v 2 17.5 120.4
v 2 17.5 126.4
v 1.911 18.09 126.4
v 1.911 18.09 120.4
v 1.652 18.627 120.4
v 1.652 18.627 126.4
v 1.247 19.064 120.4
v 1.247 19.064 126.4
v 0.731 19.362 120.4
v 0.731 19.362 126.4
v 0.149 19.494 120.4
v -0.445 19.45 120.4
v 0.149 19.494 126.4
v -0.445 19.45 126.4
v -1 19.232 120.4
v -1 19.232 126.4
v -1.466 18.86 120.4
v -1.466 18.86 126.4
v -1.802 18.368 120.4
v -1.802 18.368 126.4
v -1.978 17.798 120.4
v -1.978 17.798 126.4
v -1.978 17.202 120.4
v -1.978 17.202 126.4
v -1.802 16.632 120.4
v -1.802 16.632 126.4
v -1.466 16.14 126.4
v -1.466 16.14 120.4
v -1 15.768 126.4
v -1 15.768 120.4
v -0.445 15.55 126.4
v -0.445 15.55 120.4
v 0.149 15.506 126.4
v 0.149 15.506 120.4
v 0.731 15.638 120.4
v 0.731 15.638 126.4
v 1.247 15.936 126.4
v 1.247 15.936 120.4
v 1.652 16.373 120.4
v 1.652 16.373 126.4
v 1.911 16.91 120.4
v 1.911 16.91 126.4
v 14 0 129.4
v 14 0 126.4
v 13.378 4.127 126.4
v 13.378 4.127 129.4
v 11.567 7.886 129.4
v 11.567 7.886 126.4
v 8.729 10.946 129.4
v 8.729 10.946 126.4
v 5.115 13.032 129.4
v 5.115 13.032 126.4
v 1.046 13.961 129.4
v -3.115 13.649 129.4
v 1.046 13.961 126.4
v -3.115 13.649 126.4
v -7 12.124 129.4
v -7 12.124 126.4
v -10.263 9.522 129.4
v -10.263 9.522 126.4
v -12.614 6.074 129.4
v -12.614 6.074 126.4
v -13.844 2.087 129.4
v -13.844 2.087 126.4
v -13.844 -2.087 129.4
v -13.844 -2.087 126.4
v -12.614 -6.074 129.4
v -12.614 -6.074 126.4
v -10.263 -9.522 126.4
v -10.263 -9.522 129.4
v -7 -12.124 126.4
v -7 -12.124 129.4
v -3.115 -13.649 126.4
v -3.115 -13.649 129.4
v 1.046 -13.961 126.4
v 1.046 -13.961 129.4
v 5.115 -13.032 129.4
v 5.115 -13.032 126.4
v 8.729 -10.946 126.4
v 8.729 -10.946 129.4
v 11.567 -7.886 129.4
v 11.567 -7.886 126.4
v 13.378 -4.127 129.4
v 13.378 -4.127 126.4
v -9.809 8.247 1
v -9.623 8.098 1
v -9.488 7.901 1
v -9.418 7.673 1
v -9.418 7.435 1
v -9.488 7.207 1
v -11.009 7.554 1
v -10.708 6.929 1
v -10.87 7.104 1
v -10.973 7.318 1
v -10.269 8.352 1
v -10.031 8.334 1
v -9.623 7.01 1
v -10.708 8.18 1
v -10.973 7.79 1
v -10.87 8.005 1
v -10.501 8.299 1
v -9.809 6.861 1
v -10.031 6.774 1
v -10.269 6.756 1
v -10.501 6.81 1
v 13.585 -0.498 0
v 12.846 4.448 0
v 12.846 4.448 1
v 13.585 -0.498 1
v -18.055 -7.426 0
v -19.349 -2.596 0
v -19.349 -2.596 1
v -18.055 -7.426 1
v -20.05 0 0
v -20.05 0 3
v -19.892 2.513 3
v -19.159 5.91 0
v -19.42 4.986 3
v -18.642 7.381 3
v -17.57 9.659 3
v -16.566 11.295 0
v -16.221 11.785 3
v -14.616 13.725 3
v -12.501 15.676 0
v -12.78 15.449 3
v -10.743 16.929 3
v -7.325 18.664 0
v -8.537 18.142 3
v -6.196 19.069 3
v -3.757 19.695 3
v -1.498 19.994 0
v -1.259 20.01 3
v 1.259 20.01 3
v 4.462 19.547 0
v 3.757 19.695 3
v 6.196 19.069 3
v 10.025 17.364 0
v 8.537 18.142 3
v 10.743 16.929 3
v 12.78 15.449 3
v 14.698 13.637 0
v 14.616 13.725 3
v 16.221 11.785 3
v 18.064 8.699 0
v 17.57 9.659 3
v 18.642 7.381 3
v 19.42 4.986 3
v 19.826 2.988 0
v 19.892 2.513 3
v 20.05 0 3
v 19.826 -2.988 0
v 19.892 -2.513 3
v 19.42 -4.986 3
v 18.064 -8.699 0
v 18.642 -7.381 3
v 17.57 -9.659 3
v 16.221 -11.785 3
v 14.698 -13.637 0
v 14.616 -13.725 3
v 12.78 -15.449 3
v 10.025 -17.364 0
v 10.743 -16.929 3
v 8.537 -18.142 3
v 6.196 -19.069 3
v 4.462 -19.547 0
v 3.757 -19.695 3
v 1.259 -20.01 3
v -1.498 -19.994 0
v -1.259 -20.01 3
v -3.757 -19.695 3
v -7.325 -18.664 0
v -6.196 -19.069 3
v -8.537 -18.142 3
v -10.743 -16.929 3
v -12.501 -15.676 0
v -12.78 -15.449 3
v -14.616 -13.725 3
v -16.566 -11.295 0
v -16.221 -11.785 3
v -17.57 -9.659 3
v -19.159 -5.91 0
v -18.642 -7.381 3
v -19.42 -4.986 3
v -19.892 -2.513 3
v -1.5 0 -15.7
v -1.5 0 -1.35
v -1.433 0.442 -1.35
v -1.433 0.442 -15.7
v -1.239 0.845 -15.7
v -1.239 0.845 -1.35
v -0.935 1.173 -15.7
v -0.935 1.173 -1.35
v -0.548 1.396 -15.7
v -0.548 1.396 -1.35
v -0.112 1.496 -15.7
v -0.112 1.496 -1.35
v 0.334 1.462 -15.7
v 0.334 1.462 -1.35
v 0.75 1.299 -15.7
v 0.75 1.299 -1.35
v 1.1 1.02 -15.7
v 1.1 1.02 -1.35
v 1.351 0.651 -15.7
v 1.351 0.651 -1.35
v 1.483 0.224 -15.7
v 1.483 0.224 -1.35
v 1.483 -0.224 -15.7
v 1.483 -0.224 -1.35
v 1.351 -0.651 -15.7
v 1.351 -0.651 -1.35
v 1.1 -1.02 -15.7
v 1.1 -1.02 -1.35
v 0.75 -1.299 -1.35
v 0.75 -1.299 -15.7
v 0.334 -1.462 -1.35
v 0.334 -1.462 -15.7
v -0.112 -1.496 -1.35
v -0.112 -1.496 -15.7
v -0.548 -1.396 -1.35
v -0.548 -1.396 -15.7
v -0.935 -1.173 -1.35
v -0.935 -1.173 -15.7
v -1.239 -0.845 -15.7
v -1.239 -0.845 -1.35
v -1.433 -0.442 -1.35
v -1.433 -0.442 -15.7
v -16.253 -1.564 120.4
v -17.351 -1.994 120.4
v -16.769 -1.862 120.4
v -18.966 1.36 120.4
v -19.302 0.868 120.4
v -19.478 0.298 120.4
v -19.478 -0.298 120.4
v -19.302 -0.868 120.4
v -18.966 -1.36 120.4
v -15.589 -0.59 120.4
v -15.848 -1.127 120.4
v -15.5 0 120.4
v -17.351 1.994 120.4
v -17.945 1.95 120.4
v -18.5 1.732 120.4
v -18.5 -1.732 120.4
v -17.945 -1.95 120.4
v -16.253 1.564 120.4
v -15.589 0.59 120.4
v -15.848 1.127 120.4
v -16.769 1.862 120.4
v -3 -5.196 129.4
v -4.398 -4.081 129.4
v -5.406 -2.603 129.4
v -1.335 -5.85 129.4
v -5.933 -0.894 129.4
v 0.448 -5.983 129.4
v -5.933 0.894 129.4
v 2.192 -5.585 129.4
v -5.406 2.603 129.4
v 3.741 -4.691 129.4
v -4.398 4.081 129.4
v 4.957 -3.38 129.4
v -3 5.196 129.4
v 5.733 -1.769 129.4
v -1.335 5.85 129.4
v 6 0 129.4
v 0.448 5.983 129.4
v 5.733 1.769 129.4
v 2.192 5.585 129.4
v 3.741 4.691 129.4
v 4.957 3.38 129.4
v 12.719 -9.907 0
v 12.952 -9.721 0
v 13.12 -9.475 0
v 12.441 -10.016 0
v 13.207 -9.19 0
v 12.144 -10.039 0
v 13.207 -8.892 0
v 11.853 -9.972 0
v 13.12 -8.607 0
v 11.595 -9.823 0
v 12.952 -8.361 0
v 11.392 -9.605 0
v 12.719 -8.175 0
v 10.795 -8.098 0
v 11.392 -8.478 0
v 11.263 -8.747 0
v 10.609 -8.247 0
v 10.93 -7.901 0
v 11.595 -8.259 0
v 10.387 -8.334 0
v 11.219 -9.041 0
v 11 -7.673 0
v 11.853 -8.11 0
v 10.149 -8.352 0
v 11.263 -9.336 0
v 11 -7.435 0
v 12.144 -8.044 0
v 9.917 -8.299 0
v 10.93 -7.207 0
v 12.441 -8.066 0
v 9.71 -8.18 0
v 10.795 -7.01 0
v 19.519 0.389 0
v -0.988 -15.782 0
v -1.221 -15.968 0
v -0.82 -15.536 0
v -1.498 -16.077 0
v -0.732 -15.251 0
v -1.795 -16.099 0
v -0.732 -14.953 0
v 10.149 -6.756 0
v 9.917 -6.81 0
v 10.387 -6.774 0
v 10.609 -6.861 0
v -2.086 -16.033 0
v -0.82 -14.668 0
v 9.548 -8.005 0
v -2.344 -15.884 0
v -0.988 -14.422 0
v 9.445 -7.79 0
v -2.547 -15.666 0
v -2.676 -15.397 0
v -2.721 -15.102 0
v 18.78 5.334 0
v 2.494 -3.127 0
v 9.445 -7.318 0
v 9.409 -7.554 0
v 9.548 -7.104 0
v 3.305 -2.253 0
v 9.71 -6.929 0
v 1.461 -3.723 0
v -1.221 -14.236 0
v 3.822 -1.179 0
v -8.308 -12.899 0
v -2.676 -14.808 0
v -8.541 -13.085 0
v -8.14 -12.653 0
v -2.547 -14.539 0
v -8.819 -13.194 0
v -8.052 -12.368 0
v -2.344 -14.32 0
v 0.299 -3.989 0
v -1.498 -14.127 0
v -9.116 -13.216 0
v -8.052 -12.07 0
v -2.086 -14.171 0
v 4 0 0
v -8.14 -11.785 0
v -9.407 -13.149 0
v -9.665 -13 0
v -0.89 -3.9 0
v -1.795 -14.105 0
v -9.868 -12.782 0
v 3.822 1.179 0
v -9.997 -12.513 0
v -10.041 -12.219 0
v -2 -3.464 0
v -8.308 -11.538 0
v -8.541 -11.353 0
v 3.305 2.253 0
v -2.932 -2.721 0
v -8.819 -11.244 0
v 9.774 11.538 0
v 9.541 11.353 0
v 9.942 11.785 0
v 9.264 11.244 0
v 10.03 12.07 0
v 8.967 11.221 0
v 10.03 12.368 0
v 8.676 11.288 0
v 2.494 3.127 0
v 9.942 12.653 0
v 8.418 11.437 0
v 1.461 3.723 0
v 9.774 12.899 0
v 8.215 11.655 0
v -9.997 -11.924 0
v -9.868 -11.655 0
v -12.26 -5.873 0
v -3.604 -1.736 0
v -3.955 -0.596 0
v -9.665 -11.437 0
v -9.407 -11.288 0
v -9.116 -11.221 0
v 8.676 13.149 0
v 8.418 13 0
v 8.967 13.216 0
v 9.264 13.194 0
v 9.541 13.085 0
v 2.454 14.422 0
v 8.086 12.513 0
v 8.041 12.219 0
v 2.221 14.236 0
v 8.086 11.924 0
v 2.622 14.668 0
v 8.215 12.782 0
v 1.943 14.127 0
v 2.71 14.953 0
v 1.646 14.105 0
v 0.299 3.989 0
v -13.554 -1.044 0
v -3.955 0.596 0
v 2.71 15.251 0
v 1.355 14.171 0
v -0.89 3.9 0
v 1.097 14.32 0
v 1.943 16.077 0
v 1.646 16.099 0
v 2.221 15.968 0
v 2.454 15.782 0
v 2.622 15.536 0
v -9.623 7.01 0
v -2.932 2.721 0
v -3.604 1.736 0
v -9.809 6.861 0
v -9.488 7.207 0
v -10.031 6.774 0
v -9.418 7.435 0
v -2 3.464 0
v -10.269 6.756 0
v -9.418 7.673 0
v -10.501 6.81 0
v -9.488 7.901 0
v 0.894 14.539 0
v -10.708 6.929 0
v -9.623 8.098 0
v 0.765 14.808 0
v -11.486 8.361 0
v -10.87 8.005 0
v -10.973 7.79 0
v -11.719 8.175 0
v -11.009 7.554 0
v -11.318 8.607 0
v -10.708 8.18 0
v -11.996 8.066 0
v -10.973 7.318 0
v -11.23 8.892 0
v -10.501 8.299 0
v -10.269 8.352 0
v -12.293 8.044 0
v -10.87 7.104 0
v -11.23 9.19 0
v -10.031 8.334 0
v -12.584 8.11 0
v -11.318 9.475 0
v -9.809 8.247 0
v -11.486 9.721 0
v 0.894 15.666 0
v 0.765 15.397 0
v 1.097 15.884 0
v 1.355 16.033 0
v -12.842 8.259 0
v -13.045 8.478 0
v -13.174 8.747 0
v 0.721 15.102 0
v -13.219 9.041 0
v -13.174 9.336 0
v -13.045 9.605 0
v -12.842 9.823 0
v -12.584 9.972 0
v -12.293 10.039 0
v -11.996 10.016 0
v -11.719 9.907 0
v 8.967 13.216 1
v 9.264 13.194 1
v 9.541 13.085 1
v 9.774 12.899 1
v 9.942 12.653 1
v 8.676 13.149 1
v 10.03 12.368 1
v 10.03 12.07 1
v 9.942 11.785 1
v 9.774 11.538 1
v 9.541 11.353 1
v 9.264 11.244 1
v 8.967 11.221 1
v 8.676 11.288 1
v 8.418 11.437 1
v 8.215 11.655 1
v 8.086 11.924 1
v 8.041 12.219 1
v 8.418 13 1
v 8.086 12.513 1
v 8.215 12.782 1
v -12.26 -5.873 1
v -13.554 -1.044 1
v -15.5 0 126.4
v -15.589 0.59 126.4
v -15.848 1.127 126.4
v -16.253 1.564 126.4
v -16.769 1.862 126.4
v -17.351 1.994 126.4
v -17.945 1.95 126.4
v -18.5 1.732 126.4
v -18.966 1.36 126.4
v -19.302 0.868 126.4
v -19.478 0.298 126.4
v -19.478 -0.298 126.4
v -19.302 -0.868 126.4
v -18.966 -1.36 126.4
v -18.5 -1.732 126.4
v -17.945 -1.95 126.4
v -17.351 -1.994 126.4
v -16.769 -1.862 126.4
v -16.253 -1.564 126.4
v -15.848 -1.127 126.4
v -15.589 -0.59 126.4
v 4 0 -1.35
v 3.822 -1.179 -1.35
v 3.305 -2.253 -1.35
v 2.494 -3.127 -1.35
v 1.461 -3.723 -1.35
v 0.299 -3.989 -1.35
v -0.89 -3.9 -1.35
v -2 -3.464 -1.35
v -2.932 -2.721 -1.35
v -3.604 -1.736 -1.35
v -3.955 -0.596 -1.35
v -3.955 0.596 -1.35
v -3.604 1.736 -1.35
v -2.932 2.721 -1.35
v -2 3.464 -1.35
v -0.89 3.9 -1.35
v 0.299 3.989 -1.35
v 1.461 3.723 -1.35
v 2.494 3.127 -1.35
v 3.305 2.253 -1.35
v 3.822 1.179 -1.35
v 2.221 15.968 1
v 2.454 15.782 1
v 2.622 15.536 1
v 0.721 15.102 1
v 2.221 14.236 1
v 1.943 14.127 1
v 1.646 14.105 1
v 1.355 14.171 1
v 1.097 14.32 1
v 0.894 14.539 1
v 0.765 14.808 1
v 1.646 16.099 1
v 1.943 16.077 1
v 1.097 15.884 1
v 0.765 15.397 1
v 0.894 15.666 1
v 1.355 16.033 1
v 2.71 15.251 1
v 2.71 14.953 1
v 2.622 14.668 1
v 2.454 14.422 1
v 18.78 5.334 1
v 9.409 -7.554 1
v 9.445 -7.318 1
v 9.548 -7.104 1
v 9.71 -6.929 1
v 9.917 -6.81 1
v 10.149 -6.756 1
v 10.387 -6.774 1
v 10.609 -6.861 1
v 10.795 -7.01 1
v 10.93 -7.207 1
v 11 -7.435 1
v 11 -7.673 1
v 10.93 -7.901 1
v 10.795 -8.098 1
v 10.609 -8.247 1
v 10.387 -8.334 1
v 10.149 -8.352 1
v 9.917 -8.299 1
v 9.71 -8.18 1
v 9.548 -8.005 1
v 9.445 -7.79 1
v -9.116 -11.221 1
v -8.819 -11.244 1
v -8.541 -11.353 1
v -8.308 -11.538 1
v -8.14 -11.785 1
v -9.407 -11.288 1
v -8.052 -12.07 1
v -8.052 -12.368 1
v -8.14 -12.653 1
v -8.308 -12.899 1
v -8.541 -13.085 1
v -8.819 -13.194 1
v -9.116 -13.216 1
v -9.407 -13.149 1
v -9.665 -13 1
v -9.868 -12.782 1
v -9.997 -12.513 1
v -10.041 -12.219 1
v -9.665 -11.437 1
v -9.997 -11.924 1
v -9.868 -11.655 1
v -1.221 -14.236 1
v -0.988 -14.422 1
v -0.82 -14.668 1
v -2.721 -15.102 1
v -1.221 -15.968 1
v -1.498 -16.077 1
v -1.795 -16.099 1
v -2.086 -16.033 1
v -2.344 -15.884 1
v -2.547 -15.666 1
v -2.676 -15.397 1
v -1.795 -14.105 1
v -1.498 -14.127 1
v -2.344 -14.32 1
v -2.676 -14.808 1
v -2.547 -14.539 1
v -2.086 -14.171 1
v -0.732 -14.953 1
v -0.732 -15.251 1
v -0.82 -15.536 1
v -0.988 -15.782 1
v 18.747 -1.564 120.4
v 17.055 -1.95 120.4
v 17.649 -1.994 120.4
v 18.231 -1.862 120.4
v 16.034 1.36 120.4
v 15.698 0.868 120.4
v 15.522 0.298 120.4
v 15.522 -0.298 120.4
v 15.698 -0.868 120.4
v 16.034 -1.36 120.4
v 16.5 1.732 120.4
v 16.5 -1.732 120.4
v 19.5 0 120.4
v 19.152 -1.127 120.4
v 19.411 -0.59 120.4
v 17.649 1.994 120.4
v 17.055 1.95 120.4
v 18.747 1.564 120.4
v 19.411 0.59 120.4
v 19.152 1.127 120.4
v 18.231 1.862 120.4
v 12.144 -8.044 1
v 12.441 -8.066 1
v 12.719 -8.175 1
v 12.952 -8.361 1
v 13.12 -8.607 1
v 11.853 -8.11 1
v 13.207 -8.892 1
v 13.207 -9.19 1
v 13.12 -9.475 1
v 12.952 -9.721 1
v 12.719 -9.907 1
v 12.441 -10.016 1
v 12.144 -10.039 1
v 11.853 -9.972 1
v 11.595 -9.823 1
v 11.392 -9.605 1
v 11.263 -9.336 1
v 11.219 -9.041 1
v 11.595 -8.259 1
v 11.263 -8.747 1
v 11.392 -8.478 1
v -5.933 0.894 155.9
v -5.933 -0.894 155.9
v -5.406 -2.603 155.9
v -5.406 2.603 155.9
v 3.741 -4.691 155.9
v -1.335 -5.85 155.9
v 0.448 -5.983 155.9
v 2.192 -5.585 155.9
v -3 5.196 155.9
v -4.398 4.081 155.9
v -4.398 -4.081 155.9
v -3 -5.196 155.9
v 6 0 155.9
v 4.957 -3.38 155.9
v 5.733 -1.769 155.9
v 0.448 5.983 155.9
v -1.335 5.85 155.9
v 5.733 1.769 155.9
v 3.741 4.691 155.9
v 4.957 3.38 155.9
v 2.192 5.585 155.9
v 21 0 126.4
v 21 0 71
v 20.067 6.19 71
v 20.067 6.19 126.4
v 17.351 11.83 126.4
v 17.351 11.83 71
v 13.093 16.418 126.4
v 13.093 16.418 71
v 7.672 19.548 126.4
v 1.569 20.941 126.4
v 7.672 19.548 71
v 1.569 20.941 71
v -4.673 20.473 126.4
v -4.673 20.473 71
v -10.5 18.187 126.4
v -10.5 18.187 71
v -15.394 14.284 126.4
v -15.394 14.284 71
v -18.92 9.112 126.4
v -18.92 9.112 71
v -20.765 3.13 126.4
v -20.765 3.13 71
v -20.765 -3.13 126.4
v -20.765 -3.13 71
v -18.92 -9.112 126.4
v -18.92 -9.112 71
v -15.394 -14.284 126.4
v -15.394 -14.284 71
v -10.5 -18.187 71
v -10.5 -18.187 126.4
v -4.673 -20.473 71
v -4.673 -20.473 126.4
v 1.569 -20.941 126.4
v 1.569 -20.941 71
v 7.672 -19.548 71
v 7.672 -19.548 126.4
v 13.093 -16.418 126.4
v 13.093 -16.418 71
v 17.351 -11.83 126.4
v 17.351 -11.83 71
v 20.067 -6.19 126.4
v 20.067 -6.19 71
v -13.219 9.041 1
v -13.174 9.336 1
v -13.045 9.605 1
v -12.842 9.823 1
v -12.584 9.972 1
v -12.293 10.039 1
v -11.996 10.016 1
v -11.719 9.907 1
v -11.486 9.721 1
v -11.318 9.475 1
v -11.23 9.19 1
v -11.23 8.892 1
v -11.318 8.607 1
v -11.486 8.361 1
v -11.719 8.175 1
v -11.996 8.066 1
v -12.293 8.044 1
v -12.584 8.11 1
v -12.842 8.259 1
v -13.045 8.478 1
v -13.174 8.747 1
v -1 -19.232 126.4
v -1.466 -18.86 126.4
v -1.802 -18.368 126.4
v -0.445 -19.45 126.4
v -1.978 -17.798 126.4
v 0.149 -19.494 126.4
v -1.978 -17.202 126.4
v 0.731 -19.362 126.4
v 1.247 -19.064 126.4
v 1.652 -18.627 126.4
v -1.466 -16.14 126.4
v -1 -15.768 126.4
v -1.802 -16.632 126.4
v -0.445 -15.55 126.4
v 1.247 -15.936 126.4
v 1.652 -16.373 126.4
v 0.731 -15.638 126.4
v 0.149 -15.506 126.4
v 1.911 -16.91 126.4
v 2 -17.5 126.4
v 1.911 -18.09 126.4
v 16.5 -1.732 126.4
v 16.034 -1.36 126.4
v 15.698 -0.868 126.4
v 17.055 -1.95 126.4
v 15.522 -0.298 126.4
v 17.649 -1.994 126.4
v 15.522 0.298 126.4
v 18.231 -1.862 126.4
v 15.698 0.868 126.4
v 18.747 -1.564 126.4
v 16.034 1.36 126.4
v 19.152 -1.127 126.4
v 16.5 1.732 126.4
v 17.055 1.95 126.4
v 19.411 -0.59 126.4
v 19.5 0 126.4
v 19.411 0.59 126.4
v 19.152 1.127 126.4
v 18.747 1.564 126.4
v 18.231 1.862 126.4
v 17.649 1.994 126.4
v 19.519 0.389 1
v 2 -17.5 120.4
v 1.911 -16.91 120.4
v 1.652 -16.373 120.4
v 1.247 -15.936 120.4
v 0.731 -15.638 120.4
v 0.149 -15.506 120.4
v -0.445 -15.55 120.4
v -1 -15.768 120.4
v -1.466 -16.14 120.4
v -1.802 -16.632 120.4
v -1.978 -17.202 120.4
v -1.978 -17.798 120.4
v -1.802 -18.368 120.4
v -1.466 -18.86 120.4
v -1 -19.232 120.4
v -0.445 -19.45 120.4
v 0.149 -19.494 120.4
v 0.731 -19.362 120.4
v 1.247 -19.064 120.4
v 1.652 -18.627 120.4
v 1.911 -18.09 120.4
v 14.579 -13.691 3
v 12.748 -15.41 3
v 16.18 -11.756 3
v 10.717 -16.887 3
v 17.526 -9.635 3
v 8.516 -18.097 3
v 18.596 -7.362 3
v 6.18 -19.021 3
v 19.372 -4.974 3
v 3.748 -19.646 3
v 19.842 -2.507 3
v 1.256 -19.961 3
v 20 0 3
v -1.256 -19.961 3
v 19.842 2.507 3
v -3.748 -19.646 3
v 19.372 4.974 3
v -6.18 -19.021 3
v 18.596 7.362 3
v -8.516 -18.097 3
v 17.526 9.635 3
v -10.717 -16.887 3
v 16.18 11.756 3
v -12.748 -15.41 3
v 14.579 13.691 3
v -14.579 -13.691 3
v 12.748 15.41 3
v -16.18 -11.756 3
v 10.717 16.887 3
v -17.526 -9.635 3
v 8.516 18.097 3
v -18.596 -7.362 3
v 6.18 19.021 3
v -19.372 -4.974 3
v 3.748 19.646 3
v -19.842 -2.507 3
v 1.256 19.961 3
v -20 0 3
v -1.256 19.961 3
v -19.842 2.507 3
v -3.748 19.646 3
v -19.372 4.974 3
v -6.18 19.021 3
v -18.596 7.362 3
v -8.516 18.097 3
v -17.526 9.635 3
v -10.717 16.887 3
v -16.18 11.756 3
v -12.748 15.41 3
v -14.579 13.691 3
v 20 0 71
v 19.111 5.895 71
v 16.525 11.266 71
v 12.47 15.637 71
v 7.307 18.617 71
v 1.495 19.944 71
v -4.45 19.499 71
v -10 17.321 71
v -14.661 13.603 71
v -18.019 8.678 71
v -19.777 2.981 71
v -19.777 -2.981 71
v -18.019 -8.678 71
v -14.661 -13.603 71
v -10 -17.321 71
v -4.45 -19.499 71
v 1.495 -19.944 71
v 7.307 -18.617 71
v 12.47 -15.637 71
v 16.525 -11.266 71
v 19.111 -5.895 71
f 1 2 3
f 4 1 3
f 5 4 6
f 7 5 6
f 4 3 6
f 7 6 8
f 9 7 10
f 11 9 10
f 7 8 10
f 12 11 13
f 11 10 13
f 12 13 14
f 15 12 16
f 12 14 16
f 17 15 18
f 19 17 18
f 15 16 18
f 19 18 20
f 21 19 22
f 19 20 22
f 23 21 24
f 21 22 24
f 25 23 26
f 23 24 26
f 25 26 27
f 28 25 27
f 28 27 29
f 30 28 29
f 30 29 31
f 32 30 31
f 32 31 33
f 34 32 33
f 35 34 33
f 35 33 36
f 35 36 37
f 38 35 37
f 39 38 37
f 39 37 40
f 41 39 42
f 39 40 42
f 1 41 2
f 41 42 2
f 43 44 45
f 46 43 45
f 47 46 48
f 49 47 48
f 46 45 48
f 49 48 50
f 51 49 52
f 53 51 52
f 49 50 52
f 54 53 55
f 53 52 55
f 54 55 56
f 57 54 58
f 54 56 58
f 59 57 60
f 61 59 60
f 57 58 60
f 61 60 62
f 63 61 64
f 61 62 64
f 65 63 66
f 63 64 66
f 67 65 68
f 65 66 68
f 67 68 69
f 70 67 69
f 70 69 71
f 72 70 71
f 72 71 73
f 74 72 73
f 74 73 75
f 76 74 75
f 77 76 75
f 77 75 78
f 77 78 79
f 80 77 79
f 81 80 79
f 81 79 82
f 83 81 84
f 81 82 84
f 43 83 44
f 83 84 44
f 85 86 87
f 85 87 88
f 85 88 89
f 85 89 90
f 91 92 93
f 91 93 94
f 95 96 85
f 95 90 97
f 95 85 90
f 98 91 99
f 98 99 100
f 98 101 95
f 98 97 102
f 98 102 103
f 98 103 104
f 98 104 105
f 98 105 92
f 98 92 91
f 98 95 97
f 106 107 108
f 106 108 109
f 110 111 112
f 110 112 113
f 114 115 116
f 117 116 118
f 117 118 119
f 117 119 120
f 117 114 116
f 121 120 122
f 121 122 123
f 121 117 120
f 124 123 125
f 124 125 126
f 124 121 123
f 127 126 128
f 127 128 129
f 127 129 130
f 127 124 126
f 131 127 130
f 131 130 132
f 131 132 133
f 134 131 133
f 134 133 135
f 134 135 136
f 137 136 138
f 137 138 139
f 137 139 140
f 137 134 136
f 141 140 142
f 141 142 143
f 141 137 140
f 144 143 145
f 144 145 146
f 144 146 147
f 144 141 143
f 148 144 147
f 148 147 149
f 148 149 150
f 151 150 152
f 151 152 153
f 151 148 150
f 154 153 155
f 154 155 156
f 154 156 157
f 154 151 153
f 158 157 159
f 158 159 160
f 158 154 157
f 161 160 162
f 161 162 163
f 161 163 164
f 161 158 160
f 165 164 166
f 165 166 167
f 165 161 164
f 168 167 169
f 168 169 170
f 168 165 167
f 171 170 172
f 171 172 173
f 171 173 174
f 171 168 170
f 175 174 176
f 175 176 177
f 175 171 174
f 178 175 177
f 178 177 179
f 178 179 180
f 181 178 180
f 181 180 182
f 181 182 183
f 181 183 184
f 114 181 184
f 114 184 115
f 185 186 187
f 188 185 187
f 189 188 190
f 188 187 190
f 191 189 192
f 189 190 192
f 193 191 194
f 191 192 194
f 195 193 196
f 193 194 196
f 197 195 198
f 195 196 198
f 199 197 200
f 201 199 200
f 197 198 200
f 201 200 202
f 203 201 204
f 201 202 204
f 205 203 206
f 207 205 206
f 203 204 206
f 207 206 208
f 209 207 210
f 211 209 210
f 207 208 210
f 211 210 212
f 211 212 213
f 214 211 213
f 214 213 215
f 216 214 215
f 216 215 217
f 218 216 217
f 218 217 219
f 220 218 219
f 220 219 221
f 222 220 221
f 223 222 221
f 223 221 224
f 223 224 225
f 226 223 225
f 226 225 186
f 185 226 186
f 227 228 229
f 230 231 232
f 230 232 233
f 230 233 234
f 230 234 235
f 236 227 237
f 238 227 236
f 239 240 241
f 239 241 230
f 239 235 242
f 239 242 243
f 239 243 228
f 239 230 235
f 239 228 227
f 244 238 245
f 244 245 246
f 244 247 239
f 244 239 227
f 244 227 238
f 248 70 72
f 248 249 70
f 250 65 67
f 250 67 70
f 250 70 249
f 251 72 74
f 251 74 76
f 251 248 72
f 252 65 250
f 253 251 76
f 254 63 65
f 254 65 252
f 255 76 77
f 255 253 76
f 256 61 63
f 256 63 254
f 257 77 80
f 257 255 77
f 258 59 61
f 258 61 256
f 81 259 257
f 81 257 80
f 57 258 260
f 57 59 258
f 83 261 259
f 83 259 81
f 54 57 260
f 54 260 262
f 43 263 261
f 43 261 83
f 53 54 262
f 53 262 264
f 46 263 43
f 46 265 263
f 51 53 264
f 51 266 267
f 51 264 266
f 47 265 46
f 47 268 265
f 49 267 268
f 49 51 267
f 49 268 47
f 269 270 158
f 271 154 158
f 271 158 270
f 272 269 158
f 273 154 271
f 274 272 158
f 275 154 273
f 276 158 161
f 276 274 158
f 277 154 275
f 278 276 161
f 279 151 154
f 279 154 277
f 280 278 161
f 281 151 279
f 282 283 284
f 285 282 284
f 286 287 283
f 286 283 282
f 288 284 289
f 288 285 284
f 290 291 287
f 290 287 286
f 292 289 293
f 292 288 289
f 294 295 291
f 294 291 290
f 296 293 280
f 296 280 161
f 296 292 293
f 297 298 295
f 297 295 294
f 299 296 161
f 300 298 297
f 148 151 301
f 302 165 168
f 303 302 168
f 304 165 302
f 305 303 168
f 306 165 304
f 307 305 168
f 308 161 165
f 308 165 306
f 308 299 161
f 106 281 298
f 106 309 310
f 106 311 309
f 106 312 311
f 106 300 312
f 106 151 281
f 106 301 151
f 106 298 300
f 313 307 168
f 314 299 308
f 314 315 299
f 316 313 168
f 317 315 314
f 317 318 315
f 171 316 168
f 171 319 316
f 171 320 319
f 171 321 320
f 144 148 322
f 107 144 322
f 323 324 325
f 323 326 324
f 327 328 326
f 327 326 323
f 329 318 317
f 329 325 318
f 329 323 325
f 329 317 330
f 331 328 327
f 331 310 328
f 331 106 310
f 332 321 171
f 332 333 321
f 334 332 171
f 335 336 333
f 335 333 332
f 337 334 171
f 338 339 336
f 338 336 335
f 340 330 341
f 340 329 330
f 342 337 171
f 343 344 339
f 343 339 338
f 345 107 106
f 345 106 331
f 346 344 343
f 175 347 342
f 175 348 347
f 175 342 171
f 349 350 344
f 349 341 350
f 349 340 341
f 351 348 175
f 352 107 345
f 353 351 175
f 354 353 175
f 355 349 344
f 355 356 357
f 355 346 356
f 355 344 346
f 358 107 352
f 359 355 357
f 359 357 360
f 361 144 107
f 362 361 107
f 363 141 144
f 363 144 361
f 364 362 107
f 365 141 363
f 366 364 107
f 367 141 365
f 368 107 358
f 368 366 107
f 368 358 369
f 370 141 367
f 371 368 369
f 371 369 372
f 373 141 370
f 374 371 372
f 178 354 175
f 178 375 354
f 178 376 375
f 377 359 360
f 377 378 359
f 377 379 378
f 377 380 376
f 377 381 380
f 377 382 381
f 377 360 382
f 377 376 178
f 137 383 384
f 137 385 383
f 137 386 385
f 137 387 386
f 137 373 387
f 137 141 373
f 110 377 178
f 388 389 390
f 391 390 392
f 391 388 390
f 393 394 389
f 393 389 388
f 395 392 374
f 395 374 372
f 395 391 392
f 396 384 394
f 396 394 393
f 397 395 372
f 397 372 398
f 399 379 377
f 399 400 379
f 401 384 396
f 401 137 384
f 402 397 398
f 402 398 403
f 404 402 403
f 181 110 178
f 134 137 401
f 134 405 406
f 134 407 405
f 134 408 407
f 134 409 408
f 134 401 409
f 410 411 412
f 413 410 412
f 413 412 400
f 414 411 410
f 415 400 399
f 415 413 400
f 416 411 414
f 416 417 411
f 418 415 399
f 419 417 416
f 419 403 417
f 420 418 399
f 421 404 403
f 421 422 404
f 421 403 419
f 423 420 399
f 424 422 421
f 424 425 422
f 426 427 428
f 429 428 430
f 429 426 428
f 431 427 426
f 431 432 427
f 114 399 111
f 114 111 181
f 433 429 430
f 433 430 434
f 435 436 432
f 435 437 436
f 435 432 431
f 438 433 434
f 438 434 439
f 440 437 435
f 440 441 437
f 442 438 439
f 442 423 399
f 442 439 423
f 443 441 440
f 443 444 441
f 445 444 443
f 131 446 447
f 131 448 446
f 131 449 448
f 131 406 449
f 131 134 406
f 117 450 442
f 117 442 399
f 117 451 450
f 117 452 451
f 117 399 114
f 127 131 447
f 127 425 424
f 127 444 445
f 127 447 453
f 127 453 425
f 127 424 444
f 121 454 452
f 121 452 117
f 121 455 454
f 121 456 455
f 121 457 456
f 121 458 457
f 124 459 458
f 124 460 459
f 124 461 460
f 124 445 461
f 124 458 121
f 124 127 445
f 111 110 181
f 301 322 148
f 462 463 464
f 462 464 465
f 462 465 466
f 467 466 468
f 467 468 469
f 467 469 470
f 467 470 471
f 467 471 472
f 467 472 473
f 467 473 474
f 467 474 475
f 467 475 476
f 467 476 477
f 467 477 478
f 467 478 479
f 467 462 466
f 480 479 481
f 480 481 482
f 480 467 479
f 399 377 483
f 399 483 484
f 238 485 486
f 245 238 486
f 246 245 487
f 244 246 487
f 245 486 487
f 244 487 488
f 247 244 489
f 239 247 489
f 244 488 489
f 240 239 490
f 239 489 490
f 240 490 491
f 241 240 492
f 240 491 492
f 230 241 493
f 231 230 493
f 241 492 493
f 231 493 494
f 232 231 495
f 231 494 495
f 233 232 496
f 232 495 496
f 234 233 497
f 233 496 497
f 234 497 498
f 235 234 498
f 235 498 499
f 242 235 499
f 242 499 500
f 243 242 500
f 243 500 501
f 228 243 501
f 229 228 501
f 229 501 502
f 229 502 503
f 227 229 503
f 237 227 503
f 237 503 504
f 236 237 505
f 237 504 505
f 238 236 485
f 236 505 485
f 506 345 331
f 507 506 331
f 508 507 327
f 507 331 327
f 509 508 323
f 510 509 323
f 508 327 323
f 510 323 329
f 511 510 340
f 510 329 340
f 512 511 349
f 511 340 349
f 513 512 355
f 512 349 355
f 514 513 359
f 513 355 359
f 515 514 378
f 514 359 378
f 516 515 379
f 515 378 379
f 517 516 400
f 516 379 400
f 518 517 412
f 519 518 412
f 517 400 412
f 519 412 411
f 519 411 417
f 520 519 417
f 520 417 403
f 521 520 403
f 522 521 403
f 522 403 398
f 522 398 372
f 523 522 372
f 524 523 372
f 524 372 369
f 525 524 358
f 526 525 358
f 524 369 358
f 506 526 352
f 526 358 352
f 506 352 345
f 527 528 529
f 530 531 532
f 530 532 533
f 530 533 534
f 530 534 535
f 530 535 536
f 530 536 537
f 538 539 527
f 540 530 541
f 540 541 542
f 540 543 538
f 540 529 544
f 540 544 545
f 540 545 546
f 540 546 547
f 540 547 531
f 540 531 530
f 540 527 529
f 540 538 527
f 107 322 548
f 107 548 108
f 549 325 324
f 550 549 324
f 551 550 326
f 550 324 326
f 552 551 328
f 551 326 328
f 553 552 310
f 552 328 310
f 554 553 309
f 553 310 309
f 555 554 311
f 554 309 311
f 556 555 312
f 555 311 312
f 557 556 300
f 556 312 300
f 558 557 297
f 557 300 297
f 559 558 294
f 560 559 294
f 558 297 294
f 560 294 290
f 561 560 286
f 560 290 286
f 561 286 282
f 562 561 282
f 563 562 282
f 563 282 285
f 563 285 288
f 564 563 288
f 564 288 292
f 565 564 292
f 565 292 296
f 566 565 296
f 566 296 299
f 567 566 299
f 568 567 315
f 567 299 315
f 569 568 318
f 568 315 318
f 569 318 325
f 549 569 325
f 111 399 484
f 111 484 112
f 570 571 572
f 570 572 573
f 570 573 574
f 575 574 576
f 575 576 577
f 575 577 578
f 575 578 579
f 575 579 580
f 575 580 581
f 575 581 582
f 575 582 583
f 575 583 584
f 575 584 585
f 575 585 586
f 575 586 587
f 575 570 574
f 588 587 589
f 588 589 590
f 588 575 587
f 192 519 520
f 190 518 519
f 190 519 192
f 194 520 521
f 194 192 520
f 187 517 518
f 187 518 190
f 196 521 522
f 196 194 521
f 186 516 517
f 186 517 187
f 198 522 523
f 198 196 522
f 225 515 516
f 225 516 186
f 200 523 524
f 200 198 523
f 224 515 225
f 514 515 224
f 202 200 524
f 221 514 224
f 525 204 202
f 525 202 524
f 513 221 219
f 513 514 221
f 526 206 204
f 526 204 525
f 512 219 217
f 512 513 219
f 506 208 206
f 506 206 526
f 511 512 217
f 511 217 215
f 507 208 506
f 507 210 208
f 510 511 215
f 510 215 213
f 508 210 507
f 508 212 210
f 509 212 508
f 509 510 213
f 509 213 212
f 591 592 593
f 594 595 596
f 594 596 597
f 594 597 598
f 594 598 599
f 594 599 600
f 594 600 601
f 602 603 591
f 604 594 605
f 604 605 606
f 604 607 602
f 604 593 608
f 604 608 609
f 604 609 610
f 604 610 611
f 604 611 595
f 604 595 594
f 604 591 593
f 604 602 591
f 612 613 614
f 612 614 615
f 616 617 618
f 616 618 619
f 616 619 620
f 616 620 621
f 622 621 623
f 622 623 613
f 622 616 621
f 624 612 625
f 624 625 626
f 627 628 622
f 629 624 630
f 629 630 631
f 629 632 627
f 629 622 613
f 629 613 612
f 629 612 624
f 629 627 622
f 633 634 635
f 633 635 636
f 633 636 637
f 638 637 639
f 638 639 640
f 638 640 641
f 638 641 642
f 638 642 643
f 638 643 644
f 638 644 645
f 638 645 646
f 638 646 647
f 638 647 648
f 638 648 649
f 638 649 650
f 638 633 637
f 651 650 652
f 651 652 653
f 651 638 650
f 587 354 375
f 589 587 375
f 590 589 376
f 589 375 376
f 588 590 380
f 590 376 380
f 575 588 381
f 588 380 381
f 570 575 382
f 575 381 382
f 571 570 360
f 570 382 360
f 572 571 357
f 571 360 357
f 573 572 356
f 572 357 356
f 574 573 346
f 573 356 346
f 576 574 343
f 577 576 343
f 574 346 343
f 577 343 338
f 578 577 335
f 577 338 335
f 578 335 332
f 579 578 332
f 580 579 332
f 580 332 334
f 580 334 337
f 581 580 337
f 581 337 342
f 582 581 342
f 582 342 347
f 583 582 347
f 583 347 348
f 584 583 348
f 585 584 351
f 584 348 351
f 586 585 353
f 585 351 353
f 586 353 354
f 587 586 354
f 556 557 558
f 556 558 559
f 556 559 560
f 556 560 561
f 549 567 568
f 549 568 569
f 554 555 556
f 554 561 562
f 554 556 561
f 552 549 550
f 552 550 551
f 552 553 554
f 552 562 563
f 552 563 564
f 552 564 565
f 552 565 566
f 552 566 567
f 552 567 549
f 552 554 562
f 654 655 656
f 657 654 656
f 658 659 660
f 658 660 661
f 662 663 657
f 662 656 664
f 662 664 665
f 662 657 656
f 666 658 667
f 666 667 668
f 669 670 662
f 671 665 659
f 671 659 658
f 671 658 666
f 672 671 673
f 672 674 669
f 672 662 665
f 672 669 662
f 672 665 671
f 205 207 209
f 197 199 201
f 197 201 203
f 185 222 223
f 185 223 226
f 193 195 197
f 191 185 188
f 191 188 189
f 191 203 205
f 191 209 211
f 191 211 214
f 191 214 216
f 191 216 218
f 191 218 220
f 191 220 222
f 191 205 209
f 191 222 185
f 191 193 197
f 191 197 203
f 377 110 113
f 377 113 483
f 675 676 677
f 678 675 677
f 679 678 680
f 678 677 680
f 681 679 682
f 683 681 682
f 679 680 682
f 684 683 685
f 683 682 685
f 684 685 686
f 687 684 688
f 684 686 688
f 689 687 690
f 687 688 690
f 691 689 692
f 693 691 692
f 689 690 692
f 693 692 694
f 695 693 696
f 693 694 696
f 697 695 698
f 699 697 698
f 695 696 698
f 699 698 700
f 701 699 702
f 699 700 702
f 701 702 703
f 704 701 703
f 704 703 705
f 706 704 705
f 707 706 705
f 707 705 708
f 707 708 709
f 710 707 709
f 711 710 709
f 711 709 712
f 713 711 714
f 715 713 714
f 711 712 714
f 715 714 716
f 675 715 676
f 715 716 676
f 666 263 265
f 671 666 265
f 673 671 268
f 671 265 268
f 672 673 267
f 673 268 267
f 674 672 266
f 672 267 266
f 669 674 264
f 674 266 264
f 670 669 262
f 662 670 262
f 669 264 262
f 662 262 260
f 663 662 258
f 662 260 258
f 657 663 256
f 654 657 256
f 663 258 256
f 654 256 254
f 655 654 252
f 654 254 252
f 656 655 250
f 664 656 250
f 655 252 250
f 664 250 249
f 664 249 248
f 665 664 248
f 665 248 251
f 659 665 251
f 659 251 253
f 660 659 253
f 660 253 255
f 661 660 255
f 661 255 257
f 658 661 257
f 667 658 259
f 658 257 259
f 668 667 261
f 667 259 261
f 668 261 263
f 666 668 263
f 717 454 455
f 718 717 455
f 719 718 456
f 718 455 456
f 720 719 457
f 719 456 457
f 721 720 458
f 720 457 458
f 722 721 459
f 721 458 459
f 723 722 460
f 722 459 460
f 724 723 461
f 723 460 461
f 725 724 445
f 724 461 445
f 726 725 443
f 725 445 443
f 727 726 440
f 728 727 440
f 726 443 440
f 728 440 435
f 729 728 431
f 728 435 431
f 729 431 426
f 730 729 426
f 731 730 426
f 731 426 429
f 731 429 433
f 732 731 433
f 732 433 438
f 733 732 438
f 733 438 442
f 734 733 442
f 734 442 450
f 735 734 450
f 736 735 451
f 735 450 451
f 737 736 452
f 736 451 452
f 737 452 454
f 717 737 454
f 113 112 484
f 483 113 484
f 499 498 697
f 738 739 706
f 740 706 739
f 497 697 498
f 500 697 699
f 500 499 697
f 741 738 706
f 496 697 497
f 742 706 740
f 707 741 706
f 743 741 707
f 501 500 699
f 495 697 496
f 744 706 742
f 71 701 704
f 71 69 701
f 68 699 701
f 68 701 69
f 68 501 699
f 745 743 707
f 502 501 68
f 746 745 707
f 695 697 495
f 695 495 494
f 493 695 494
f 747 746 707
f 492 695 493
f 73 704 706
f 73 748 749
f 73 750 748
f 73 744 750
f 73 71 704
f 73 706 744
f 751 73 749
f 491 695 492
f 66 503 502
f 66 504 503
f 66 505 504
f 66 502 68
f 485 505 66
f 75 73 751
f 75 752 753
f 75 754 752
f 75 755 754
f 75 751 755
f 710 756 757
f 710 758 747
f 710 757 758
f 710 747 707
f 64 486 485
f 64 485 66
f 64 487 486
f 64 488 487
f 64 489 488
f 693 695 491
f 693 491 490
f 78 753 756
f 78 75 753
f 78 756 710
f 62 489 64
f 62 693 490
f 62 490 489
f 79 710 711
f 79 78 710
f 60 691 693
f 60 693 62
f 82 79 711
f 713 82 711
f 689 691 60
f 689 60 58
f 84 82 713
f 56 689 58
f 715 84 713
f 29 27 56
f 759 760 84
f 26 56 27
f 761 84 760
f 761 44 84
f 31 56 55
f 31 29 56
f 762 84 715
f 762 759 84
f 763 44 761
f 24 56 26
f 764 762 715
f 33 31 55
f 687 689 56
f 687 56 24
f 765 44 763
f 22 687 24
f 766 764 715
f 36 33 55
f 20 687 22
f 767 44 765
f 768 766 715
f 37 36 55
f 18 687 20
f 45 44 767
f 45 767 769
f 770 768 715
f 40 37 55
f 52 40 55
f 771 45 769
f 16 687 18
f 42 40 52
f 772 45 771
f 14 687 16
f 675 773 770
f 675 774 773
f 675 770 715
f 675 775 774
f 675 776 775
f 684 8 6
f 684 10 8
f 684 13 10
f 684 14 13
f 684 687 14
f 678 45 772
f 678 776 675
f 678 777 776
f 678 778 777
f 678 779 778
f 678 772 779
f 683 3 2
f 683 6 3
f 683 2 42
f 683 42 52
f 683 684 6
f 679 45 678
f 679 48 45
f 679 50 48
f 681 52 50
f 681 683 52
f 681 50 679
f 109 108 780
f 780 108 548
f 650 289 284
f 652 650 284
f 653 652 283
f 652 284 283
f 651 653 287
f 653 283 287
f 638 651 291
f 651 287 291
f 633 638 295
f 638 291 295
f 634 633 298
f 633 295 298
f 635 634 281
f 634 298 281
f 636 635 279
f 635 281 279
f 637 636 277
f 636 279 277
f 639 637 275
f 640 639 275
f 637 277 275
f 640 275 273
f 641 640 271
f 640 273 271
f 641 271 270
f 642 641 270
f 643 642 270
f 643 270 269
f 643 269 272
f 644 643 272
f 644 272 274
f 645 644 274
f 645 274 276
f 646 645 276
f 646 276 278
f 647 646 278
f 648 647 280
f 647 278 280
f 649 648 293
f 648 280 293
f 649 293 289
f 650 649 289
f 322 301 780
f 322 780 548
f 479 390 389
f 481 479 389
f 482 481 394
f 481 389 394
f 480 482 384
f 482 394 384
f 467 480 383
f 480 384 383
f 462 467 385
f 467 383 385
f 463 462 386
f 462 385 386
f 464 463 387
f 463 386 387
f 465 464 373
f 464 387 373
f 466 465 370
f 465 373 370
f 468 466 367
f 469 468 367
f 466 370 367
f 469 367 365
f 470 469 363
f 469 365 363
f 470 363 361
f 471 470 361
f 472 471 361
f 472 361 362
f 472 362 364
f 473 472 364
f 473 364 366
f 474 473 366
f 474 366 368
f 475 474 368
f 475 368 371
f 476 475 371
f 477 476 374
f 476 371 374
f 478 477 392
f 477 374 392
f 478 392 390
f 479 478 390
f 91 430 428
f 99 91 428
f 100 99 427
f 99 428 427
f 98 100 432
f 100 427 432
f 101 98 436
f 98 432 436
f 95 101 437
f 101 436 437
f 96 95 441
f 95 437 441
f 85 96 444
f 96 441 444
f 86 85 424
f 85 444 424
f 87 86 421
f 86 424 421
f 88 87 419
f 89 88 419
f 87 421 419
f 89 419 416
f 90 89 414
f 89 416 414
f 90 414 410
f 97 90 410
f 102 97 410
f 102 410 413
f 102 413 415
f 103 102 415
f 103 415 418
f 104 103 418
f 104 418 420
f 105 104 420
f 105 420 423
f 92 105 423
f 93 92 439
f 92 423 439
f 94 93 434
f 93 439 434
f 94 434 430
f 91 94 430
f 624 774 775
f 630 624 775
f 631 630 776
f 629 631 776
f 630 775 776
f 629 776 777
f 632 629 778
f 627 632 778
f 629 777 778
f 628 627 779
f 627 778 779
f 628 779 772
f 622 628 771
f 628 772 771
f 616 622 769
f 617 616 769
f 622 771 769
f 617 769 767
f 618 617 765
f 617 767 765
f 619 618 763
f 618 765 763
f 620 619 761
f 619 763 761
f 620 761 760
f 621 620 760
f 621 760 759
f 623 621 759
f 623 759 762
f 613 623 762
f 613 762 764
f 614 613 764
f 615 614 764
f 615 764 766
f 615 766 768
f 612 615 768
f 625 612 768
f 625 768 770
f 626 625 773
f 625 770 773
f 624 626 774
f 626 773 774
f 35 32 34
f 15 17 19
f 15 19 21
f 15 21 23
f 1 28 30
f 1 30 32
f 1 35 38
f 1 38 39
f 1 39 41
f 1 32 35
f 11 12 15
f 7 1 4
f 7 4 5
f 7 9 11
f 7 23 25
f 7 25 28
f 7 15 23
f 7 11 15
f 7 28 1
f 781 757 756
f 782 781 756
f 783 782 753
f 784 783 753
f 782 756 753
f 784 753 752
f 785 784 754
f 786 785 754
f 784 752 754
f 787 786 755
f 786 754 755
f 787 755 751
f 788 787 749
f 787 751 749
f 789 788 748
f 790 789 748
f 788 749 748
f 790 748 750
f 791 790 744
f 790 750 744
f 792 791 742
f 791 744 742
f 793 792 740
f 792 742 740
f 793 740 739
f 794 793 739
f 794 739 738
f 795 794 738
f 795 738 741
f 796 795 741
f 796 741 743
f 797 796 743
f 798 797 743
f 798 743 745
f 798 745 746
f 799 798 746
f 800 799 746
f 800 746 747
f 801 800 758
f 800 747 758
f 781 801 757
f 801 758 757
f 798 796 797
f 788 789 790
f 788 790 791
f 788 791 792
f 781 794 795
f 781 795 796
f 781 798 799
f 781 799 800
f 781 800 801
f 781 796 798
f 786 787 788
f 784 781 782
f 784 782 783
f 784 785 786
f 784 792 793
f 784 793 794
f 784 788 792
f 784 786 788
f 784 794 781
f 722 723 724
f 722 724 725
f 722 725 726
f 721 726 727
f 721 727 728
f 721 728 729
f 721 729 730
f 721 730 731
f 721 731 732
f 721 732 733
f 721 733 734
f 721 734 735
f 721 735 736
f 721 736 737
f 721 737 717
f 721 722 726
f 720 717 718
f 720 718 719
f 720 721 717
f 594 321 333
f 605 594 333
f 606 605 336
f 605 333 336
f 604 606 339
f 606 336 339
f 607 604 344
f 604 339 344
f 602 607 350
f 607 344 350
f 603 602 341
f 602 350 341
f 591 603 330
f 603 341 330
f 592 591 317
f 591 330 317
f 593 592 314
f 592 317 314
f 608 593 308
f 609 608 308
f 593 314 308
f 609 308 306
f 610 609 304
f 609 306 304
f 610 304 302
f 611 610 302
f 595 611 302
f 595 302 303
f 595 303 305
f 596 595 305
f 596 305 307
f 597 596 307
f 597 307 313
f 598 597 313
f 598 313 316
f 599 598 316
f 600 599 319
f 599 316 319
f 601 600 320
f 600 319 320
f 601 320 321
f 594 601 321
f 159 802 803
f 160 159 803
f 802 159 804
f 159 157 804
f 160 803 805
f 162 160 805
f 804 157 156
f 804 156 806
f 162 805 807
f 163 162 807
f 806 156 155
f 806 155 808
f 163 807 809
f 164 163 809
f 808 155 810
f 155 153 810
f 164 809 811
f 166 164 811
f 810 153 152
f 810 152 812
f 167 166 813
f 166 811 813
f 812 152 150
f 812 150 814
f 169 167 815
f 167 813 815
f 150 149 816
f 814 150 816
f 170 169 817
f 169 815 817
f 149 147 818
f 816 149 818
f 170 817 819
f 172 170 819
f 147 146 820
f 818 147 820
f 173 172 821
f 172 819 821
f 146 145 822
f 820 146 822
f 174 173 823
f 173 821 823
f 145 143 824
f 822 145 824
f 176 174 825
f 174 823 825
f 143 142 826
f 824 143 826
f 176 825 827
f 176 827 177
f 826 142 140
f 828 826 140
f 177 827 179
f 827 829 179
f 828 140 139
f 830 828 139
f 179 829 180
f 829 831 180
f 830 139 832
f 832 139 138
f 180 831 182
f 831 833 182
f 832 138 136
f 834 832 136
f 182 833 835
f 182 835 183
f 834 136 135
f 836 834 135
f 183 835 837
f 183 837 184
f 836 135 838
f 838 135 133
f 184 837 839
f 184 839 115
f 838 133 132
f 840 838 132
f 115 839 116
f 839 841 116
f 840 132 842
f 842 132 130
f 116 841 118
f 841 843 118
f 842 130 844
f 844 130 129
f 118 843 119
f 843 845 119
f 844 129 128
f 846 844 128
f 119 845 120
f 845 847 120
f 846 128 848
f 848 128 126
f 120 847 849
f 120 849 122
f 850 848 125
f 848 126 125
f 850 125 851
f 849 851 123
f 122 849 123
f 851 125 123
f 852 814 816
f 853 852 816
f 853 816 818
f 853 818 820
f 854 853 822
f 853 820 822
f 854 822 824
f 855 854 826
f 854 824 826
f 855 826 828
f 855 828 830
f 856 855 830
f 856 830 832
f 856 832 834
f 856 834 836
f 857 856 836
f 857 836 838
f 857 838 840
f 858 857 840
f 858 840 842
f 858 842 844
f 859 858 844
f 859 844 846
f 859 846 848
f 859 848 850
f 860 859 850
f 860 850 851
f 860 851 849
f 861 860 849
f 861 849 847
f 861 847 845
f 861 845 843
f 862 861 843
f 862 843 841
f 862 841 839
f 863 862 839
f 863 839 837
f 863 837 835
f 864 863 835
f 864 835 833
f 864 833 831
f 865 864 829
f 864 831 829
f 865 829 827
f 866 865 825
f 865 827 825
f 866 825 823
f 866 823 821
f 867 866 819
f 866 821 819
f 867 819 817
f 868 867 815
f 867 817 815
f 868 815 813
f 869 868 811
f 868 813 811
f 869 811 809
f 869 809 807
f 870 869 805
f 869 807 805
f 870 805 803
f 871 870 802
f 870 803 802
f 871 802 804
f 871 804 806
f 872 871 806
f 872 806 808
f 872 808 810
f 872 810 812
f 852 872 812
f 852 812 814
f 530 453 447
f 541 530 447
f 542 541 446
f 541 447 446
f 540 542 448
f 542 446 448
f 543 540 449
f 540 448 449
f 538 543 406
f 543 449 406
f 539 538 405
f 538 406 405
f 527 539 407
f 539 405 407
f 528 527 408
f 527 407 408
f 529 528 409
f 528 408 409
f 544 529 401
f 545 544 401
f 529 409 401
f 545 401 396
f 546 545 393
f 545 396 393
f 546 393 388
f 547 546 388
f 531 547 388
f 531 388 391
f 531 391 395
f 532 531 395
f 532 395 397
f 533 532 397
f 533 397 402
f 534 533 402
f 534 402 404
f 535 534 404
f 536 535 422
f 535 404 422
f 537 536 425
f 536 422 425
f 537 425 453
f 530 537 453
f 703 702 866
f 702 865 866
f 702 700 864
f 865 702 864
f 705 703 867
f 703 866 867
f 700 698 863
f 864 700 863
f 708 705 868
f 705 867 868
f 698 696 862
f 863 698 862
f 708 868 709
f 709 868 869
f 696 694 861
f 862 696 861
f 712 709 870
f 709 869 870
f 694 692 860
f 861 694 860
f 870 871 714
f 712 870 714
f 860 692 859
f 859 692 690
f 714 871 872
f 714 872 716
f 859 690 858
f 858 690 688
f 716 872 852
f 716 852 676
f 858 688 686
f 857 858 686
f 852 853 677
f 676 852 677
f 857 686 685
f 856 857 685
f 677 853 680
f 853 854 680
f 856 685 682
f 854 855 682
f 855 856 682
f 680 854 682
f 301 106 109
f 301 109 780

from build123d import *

# Parameters (mm, degrees)
ESQUISSE1_R             = 20
BOSS_EXTRU_1_DEPTH      = 71
ESQUISSE2_R             = 4
BOSS_EXTRU_2_DEPTH      = 1.35
ESQUISSE3_R             = 1.5
BOSS_EXTRU_3_DEPTH      = 15.7
ESQUISSE11_R            = 20.05
BOSS_EXTRU_8_DEPTH      = 3
ESQUISSE12_R            = 1
ESQUISSE12_R_2          = 0.8
ENL_V_MAT_EXTRU_4_DEPTH = 1
ESQUISSE4_R             = 21
BOSS_EXTRU_9_DEPTH      = 55.4
ESQUISSE13_R            = 14
BOSS_EXTRU_10_DEPTH     = 3
ESQUISSE14_R            = 6
BOSS_EXTRU_11_DEPTH     = 26.5
ESQUISSE15_R            = 2
ENL_V_MAT_EXTRU_5_DEPTH = 6


with BuildPart() as part:
    # Esquisse1 → Boss.-Extru.1 (new body)
    with BuildSketch(Plane.XY):
        Circle(ESQUISSE1_R)
    extrude(amount=BOSS_EXTRU_1_DEPTH)

    # Esquisse2 → Boss.-Extru.2 (add)
    with BuildSketch(Plane(origin=(0, 0, 0), x_dir=(-1, 0, 0), z_dir=(0, 0, -1))):
        with Locations(Location((0, 0, 0), (0, 0, 180))):
            Circle(ESQUISSE2_R)
    extrude(amount=BOSS_EXTRU_2_DEPTH)

    # Esquisse3 → Boss.-Extru.3 (add)
    with BuildSketch(Plane(origin=(0, 0, 0), x_dir=(-1, 0, 0), z_dir=(0, 0, -1))):
        Circle(ESQUISSE3_R)
    extrude(amount=BOSS_EXTRU_3_DEPTH)

    # Esquisse11 → Boss.-Extru.8 (add)
    with BuildSketch(Plane(origin=(0, 0, 0), x_dir=(-1, 0, 0), z_dir=(0, 0, -1))):
        Circle(ESQUISSE11_R)
    extrude(amount=-BOSS_EXTRU_8_DEPTH)

    # Esquisse12 → Enlèv. mat.-Extru.4 (cut)
    with BuildSketch(Plane(origin=(0, 0, 0), x_dir=(-1, 0, 0), z_dir=(0, 0, -1))):
        with Locations((1.720688849, -15.102292206)):
            Circle(ESQUISSE12_R)
        with Locations((-1.720688849, 15.102292206)):
            Circle(ESQUISSE12_R)
        with Locations((-12.218624281, -9.041306359)):
            Circle(ESQUISSE12_R)
        with Locations((10.20898213, 7.554249392)):
            Circle(ESQUISSE12_R_2)
        with Locations((-10.20898213, -7.554249392)):
            Circle(ESQUISSE12_R_2)
        with Locations((-9.041306359, 12.218624281)):
            Circle(ESQUISSE12_R)
        with Locations((12.218624281, 9.041306359)):
            Circle(ESQUISSE12_R)
        with Locations((9.041306359, -12.218624281)):
            Circle(ESQUISSE12_R)
        Polygon((13.553659243, -1.043501598), (19.3492142, -2.596415868), (18.055118975, -7.426045), (12.259564017, -5.873130729), align=None)
        Polygon((-13.584662099, -0.497523966), (-19.51875728, 0.389332501), (-18.779710224, 5.334411818), (-12.845615044, 4.447555351), align=None)
    extrude(amount=-ENL_V_MAT_EXTRU_4_DEPTH, mode=Mode.SUBTRACT)

    # Esquisse4 → Boss.-Extru.9 (add)
    with BuildSketch(Plane.XY.offset(71)):
        Circle(ESQUISSE4_R)
    extrude(amount=BOSS_EXTRU_9_DEPTH)

    # Esquisse13 → Boss.-Extru.10 (add)
    with BuildSketch(Plane.XY.offset(126.4)):
        Circle(ESQUISSE13_R)
    extrude(amount=BOSS_EXTRU_10_DEPTH)

    # Esquisse14 → Boss.-Extru.11 (add)
    with BuildSketch(Plane.XY.offset(129.4)):
        Circle(ESQUISSE14_R)
    extrude(amount=BOSS_EXTRU_11_DEPTH)

    # Esquisse15 → Enlèv. mat.-Extru.5 (cut)
    with BuildSketch(Plane.XY.offset(126.4)):
        with Locations((0, -17.5)):
            Circle(ESQUISSE15_R)
        with Locations((-17.5, 0)):
            Circle(ESQUISSE15_R)
        with Locations((0, 17.5)):
            Circle(ESQUISSE15_R)
        with Locations((17.5, 0)):
            Circle(ESQUISSE15_R)
    extrude(amount=-ENL_V_MAT_EXTRU_5_DEPTH, mode=Mode.SUBTRACT)


solid = part.part
